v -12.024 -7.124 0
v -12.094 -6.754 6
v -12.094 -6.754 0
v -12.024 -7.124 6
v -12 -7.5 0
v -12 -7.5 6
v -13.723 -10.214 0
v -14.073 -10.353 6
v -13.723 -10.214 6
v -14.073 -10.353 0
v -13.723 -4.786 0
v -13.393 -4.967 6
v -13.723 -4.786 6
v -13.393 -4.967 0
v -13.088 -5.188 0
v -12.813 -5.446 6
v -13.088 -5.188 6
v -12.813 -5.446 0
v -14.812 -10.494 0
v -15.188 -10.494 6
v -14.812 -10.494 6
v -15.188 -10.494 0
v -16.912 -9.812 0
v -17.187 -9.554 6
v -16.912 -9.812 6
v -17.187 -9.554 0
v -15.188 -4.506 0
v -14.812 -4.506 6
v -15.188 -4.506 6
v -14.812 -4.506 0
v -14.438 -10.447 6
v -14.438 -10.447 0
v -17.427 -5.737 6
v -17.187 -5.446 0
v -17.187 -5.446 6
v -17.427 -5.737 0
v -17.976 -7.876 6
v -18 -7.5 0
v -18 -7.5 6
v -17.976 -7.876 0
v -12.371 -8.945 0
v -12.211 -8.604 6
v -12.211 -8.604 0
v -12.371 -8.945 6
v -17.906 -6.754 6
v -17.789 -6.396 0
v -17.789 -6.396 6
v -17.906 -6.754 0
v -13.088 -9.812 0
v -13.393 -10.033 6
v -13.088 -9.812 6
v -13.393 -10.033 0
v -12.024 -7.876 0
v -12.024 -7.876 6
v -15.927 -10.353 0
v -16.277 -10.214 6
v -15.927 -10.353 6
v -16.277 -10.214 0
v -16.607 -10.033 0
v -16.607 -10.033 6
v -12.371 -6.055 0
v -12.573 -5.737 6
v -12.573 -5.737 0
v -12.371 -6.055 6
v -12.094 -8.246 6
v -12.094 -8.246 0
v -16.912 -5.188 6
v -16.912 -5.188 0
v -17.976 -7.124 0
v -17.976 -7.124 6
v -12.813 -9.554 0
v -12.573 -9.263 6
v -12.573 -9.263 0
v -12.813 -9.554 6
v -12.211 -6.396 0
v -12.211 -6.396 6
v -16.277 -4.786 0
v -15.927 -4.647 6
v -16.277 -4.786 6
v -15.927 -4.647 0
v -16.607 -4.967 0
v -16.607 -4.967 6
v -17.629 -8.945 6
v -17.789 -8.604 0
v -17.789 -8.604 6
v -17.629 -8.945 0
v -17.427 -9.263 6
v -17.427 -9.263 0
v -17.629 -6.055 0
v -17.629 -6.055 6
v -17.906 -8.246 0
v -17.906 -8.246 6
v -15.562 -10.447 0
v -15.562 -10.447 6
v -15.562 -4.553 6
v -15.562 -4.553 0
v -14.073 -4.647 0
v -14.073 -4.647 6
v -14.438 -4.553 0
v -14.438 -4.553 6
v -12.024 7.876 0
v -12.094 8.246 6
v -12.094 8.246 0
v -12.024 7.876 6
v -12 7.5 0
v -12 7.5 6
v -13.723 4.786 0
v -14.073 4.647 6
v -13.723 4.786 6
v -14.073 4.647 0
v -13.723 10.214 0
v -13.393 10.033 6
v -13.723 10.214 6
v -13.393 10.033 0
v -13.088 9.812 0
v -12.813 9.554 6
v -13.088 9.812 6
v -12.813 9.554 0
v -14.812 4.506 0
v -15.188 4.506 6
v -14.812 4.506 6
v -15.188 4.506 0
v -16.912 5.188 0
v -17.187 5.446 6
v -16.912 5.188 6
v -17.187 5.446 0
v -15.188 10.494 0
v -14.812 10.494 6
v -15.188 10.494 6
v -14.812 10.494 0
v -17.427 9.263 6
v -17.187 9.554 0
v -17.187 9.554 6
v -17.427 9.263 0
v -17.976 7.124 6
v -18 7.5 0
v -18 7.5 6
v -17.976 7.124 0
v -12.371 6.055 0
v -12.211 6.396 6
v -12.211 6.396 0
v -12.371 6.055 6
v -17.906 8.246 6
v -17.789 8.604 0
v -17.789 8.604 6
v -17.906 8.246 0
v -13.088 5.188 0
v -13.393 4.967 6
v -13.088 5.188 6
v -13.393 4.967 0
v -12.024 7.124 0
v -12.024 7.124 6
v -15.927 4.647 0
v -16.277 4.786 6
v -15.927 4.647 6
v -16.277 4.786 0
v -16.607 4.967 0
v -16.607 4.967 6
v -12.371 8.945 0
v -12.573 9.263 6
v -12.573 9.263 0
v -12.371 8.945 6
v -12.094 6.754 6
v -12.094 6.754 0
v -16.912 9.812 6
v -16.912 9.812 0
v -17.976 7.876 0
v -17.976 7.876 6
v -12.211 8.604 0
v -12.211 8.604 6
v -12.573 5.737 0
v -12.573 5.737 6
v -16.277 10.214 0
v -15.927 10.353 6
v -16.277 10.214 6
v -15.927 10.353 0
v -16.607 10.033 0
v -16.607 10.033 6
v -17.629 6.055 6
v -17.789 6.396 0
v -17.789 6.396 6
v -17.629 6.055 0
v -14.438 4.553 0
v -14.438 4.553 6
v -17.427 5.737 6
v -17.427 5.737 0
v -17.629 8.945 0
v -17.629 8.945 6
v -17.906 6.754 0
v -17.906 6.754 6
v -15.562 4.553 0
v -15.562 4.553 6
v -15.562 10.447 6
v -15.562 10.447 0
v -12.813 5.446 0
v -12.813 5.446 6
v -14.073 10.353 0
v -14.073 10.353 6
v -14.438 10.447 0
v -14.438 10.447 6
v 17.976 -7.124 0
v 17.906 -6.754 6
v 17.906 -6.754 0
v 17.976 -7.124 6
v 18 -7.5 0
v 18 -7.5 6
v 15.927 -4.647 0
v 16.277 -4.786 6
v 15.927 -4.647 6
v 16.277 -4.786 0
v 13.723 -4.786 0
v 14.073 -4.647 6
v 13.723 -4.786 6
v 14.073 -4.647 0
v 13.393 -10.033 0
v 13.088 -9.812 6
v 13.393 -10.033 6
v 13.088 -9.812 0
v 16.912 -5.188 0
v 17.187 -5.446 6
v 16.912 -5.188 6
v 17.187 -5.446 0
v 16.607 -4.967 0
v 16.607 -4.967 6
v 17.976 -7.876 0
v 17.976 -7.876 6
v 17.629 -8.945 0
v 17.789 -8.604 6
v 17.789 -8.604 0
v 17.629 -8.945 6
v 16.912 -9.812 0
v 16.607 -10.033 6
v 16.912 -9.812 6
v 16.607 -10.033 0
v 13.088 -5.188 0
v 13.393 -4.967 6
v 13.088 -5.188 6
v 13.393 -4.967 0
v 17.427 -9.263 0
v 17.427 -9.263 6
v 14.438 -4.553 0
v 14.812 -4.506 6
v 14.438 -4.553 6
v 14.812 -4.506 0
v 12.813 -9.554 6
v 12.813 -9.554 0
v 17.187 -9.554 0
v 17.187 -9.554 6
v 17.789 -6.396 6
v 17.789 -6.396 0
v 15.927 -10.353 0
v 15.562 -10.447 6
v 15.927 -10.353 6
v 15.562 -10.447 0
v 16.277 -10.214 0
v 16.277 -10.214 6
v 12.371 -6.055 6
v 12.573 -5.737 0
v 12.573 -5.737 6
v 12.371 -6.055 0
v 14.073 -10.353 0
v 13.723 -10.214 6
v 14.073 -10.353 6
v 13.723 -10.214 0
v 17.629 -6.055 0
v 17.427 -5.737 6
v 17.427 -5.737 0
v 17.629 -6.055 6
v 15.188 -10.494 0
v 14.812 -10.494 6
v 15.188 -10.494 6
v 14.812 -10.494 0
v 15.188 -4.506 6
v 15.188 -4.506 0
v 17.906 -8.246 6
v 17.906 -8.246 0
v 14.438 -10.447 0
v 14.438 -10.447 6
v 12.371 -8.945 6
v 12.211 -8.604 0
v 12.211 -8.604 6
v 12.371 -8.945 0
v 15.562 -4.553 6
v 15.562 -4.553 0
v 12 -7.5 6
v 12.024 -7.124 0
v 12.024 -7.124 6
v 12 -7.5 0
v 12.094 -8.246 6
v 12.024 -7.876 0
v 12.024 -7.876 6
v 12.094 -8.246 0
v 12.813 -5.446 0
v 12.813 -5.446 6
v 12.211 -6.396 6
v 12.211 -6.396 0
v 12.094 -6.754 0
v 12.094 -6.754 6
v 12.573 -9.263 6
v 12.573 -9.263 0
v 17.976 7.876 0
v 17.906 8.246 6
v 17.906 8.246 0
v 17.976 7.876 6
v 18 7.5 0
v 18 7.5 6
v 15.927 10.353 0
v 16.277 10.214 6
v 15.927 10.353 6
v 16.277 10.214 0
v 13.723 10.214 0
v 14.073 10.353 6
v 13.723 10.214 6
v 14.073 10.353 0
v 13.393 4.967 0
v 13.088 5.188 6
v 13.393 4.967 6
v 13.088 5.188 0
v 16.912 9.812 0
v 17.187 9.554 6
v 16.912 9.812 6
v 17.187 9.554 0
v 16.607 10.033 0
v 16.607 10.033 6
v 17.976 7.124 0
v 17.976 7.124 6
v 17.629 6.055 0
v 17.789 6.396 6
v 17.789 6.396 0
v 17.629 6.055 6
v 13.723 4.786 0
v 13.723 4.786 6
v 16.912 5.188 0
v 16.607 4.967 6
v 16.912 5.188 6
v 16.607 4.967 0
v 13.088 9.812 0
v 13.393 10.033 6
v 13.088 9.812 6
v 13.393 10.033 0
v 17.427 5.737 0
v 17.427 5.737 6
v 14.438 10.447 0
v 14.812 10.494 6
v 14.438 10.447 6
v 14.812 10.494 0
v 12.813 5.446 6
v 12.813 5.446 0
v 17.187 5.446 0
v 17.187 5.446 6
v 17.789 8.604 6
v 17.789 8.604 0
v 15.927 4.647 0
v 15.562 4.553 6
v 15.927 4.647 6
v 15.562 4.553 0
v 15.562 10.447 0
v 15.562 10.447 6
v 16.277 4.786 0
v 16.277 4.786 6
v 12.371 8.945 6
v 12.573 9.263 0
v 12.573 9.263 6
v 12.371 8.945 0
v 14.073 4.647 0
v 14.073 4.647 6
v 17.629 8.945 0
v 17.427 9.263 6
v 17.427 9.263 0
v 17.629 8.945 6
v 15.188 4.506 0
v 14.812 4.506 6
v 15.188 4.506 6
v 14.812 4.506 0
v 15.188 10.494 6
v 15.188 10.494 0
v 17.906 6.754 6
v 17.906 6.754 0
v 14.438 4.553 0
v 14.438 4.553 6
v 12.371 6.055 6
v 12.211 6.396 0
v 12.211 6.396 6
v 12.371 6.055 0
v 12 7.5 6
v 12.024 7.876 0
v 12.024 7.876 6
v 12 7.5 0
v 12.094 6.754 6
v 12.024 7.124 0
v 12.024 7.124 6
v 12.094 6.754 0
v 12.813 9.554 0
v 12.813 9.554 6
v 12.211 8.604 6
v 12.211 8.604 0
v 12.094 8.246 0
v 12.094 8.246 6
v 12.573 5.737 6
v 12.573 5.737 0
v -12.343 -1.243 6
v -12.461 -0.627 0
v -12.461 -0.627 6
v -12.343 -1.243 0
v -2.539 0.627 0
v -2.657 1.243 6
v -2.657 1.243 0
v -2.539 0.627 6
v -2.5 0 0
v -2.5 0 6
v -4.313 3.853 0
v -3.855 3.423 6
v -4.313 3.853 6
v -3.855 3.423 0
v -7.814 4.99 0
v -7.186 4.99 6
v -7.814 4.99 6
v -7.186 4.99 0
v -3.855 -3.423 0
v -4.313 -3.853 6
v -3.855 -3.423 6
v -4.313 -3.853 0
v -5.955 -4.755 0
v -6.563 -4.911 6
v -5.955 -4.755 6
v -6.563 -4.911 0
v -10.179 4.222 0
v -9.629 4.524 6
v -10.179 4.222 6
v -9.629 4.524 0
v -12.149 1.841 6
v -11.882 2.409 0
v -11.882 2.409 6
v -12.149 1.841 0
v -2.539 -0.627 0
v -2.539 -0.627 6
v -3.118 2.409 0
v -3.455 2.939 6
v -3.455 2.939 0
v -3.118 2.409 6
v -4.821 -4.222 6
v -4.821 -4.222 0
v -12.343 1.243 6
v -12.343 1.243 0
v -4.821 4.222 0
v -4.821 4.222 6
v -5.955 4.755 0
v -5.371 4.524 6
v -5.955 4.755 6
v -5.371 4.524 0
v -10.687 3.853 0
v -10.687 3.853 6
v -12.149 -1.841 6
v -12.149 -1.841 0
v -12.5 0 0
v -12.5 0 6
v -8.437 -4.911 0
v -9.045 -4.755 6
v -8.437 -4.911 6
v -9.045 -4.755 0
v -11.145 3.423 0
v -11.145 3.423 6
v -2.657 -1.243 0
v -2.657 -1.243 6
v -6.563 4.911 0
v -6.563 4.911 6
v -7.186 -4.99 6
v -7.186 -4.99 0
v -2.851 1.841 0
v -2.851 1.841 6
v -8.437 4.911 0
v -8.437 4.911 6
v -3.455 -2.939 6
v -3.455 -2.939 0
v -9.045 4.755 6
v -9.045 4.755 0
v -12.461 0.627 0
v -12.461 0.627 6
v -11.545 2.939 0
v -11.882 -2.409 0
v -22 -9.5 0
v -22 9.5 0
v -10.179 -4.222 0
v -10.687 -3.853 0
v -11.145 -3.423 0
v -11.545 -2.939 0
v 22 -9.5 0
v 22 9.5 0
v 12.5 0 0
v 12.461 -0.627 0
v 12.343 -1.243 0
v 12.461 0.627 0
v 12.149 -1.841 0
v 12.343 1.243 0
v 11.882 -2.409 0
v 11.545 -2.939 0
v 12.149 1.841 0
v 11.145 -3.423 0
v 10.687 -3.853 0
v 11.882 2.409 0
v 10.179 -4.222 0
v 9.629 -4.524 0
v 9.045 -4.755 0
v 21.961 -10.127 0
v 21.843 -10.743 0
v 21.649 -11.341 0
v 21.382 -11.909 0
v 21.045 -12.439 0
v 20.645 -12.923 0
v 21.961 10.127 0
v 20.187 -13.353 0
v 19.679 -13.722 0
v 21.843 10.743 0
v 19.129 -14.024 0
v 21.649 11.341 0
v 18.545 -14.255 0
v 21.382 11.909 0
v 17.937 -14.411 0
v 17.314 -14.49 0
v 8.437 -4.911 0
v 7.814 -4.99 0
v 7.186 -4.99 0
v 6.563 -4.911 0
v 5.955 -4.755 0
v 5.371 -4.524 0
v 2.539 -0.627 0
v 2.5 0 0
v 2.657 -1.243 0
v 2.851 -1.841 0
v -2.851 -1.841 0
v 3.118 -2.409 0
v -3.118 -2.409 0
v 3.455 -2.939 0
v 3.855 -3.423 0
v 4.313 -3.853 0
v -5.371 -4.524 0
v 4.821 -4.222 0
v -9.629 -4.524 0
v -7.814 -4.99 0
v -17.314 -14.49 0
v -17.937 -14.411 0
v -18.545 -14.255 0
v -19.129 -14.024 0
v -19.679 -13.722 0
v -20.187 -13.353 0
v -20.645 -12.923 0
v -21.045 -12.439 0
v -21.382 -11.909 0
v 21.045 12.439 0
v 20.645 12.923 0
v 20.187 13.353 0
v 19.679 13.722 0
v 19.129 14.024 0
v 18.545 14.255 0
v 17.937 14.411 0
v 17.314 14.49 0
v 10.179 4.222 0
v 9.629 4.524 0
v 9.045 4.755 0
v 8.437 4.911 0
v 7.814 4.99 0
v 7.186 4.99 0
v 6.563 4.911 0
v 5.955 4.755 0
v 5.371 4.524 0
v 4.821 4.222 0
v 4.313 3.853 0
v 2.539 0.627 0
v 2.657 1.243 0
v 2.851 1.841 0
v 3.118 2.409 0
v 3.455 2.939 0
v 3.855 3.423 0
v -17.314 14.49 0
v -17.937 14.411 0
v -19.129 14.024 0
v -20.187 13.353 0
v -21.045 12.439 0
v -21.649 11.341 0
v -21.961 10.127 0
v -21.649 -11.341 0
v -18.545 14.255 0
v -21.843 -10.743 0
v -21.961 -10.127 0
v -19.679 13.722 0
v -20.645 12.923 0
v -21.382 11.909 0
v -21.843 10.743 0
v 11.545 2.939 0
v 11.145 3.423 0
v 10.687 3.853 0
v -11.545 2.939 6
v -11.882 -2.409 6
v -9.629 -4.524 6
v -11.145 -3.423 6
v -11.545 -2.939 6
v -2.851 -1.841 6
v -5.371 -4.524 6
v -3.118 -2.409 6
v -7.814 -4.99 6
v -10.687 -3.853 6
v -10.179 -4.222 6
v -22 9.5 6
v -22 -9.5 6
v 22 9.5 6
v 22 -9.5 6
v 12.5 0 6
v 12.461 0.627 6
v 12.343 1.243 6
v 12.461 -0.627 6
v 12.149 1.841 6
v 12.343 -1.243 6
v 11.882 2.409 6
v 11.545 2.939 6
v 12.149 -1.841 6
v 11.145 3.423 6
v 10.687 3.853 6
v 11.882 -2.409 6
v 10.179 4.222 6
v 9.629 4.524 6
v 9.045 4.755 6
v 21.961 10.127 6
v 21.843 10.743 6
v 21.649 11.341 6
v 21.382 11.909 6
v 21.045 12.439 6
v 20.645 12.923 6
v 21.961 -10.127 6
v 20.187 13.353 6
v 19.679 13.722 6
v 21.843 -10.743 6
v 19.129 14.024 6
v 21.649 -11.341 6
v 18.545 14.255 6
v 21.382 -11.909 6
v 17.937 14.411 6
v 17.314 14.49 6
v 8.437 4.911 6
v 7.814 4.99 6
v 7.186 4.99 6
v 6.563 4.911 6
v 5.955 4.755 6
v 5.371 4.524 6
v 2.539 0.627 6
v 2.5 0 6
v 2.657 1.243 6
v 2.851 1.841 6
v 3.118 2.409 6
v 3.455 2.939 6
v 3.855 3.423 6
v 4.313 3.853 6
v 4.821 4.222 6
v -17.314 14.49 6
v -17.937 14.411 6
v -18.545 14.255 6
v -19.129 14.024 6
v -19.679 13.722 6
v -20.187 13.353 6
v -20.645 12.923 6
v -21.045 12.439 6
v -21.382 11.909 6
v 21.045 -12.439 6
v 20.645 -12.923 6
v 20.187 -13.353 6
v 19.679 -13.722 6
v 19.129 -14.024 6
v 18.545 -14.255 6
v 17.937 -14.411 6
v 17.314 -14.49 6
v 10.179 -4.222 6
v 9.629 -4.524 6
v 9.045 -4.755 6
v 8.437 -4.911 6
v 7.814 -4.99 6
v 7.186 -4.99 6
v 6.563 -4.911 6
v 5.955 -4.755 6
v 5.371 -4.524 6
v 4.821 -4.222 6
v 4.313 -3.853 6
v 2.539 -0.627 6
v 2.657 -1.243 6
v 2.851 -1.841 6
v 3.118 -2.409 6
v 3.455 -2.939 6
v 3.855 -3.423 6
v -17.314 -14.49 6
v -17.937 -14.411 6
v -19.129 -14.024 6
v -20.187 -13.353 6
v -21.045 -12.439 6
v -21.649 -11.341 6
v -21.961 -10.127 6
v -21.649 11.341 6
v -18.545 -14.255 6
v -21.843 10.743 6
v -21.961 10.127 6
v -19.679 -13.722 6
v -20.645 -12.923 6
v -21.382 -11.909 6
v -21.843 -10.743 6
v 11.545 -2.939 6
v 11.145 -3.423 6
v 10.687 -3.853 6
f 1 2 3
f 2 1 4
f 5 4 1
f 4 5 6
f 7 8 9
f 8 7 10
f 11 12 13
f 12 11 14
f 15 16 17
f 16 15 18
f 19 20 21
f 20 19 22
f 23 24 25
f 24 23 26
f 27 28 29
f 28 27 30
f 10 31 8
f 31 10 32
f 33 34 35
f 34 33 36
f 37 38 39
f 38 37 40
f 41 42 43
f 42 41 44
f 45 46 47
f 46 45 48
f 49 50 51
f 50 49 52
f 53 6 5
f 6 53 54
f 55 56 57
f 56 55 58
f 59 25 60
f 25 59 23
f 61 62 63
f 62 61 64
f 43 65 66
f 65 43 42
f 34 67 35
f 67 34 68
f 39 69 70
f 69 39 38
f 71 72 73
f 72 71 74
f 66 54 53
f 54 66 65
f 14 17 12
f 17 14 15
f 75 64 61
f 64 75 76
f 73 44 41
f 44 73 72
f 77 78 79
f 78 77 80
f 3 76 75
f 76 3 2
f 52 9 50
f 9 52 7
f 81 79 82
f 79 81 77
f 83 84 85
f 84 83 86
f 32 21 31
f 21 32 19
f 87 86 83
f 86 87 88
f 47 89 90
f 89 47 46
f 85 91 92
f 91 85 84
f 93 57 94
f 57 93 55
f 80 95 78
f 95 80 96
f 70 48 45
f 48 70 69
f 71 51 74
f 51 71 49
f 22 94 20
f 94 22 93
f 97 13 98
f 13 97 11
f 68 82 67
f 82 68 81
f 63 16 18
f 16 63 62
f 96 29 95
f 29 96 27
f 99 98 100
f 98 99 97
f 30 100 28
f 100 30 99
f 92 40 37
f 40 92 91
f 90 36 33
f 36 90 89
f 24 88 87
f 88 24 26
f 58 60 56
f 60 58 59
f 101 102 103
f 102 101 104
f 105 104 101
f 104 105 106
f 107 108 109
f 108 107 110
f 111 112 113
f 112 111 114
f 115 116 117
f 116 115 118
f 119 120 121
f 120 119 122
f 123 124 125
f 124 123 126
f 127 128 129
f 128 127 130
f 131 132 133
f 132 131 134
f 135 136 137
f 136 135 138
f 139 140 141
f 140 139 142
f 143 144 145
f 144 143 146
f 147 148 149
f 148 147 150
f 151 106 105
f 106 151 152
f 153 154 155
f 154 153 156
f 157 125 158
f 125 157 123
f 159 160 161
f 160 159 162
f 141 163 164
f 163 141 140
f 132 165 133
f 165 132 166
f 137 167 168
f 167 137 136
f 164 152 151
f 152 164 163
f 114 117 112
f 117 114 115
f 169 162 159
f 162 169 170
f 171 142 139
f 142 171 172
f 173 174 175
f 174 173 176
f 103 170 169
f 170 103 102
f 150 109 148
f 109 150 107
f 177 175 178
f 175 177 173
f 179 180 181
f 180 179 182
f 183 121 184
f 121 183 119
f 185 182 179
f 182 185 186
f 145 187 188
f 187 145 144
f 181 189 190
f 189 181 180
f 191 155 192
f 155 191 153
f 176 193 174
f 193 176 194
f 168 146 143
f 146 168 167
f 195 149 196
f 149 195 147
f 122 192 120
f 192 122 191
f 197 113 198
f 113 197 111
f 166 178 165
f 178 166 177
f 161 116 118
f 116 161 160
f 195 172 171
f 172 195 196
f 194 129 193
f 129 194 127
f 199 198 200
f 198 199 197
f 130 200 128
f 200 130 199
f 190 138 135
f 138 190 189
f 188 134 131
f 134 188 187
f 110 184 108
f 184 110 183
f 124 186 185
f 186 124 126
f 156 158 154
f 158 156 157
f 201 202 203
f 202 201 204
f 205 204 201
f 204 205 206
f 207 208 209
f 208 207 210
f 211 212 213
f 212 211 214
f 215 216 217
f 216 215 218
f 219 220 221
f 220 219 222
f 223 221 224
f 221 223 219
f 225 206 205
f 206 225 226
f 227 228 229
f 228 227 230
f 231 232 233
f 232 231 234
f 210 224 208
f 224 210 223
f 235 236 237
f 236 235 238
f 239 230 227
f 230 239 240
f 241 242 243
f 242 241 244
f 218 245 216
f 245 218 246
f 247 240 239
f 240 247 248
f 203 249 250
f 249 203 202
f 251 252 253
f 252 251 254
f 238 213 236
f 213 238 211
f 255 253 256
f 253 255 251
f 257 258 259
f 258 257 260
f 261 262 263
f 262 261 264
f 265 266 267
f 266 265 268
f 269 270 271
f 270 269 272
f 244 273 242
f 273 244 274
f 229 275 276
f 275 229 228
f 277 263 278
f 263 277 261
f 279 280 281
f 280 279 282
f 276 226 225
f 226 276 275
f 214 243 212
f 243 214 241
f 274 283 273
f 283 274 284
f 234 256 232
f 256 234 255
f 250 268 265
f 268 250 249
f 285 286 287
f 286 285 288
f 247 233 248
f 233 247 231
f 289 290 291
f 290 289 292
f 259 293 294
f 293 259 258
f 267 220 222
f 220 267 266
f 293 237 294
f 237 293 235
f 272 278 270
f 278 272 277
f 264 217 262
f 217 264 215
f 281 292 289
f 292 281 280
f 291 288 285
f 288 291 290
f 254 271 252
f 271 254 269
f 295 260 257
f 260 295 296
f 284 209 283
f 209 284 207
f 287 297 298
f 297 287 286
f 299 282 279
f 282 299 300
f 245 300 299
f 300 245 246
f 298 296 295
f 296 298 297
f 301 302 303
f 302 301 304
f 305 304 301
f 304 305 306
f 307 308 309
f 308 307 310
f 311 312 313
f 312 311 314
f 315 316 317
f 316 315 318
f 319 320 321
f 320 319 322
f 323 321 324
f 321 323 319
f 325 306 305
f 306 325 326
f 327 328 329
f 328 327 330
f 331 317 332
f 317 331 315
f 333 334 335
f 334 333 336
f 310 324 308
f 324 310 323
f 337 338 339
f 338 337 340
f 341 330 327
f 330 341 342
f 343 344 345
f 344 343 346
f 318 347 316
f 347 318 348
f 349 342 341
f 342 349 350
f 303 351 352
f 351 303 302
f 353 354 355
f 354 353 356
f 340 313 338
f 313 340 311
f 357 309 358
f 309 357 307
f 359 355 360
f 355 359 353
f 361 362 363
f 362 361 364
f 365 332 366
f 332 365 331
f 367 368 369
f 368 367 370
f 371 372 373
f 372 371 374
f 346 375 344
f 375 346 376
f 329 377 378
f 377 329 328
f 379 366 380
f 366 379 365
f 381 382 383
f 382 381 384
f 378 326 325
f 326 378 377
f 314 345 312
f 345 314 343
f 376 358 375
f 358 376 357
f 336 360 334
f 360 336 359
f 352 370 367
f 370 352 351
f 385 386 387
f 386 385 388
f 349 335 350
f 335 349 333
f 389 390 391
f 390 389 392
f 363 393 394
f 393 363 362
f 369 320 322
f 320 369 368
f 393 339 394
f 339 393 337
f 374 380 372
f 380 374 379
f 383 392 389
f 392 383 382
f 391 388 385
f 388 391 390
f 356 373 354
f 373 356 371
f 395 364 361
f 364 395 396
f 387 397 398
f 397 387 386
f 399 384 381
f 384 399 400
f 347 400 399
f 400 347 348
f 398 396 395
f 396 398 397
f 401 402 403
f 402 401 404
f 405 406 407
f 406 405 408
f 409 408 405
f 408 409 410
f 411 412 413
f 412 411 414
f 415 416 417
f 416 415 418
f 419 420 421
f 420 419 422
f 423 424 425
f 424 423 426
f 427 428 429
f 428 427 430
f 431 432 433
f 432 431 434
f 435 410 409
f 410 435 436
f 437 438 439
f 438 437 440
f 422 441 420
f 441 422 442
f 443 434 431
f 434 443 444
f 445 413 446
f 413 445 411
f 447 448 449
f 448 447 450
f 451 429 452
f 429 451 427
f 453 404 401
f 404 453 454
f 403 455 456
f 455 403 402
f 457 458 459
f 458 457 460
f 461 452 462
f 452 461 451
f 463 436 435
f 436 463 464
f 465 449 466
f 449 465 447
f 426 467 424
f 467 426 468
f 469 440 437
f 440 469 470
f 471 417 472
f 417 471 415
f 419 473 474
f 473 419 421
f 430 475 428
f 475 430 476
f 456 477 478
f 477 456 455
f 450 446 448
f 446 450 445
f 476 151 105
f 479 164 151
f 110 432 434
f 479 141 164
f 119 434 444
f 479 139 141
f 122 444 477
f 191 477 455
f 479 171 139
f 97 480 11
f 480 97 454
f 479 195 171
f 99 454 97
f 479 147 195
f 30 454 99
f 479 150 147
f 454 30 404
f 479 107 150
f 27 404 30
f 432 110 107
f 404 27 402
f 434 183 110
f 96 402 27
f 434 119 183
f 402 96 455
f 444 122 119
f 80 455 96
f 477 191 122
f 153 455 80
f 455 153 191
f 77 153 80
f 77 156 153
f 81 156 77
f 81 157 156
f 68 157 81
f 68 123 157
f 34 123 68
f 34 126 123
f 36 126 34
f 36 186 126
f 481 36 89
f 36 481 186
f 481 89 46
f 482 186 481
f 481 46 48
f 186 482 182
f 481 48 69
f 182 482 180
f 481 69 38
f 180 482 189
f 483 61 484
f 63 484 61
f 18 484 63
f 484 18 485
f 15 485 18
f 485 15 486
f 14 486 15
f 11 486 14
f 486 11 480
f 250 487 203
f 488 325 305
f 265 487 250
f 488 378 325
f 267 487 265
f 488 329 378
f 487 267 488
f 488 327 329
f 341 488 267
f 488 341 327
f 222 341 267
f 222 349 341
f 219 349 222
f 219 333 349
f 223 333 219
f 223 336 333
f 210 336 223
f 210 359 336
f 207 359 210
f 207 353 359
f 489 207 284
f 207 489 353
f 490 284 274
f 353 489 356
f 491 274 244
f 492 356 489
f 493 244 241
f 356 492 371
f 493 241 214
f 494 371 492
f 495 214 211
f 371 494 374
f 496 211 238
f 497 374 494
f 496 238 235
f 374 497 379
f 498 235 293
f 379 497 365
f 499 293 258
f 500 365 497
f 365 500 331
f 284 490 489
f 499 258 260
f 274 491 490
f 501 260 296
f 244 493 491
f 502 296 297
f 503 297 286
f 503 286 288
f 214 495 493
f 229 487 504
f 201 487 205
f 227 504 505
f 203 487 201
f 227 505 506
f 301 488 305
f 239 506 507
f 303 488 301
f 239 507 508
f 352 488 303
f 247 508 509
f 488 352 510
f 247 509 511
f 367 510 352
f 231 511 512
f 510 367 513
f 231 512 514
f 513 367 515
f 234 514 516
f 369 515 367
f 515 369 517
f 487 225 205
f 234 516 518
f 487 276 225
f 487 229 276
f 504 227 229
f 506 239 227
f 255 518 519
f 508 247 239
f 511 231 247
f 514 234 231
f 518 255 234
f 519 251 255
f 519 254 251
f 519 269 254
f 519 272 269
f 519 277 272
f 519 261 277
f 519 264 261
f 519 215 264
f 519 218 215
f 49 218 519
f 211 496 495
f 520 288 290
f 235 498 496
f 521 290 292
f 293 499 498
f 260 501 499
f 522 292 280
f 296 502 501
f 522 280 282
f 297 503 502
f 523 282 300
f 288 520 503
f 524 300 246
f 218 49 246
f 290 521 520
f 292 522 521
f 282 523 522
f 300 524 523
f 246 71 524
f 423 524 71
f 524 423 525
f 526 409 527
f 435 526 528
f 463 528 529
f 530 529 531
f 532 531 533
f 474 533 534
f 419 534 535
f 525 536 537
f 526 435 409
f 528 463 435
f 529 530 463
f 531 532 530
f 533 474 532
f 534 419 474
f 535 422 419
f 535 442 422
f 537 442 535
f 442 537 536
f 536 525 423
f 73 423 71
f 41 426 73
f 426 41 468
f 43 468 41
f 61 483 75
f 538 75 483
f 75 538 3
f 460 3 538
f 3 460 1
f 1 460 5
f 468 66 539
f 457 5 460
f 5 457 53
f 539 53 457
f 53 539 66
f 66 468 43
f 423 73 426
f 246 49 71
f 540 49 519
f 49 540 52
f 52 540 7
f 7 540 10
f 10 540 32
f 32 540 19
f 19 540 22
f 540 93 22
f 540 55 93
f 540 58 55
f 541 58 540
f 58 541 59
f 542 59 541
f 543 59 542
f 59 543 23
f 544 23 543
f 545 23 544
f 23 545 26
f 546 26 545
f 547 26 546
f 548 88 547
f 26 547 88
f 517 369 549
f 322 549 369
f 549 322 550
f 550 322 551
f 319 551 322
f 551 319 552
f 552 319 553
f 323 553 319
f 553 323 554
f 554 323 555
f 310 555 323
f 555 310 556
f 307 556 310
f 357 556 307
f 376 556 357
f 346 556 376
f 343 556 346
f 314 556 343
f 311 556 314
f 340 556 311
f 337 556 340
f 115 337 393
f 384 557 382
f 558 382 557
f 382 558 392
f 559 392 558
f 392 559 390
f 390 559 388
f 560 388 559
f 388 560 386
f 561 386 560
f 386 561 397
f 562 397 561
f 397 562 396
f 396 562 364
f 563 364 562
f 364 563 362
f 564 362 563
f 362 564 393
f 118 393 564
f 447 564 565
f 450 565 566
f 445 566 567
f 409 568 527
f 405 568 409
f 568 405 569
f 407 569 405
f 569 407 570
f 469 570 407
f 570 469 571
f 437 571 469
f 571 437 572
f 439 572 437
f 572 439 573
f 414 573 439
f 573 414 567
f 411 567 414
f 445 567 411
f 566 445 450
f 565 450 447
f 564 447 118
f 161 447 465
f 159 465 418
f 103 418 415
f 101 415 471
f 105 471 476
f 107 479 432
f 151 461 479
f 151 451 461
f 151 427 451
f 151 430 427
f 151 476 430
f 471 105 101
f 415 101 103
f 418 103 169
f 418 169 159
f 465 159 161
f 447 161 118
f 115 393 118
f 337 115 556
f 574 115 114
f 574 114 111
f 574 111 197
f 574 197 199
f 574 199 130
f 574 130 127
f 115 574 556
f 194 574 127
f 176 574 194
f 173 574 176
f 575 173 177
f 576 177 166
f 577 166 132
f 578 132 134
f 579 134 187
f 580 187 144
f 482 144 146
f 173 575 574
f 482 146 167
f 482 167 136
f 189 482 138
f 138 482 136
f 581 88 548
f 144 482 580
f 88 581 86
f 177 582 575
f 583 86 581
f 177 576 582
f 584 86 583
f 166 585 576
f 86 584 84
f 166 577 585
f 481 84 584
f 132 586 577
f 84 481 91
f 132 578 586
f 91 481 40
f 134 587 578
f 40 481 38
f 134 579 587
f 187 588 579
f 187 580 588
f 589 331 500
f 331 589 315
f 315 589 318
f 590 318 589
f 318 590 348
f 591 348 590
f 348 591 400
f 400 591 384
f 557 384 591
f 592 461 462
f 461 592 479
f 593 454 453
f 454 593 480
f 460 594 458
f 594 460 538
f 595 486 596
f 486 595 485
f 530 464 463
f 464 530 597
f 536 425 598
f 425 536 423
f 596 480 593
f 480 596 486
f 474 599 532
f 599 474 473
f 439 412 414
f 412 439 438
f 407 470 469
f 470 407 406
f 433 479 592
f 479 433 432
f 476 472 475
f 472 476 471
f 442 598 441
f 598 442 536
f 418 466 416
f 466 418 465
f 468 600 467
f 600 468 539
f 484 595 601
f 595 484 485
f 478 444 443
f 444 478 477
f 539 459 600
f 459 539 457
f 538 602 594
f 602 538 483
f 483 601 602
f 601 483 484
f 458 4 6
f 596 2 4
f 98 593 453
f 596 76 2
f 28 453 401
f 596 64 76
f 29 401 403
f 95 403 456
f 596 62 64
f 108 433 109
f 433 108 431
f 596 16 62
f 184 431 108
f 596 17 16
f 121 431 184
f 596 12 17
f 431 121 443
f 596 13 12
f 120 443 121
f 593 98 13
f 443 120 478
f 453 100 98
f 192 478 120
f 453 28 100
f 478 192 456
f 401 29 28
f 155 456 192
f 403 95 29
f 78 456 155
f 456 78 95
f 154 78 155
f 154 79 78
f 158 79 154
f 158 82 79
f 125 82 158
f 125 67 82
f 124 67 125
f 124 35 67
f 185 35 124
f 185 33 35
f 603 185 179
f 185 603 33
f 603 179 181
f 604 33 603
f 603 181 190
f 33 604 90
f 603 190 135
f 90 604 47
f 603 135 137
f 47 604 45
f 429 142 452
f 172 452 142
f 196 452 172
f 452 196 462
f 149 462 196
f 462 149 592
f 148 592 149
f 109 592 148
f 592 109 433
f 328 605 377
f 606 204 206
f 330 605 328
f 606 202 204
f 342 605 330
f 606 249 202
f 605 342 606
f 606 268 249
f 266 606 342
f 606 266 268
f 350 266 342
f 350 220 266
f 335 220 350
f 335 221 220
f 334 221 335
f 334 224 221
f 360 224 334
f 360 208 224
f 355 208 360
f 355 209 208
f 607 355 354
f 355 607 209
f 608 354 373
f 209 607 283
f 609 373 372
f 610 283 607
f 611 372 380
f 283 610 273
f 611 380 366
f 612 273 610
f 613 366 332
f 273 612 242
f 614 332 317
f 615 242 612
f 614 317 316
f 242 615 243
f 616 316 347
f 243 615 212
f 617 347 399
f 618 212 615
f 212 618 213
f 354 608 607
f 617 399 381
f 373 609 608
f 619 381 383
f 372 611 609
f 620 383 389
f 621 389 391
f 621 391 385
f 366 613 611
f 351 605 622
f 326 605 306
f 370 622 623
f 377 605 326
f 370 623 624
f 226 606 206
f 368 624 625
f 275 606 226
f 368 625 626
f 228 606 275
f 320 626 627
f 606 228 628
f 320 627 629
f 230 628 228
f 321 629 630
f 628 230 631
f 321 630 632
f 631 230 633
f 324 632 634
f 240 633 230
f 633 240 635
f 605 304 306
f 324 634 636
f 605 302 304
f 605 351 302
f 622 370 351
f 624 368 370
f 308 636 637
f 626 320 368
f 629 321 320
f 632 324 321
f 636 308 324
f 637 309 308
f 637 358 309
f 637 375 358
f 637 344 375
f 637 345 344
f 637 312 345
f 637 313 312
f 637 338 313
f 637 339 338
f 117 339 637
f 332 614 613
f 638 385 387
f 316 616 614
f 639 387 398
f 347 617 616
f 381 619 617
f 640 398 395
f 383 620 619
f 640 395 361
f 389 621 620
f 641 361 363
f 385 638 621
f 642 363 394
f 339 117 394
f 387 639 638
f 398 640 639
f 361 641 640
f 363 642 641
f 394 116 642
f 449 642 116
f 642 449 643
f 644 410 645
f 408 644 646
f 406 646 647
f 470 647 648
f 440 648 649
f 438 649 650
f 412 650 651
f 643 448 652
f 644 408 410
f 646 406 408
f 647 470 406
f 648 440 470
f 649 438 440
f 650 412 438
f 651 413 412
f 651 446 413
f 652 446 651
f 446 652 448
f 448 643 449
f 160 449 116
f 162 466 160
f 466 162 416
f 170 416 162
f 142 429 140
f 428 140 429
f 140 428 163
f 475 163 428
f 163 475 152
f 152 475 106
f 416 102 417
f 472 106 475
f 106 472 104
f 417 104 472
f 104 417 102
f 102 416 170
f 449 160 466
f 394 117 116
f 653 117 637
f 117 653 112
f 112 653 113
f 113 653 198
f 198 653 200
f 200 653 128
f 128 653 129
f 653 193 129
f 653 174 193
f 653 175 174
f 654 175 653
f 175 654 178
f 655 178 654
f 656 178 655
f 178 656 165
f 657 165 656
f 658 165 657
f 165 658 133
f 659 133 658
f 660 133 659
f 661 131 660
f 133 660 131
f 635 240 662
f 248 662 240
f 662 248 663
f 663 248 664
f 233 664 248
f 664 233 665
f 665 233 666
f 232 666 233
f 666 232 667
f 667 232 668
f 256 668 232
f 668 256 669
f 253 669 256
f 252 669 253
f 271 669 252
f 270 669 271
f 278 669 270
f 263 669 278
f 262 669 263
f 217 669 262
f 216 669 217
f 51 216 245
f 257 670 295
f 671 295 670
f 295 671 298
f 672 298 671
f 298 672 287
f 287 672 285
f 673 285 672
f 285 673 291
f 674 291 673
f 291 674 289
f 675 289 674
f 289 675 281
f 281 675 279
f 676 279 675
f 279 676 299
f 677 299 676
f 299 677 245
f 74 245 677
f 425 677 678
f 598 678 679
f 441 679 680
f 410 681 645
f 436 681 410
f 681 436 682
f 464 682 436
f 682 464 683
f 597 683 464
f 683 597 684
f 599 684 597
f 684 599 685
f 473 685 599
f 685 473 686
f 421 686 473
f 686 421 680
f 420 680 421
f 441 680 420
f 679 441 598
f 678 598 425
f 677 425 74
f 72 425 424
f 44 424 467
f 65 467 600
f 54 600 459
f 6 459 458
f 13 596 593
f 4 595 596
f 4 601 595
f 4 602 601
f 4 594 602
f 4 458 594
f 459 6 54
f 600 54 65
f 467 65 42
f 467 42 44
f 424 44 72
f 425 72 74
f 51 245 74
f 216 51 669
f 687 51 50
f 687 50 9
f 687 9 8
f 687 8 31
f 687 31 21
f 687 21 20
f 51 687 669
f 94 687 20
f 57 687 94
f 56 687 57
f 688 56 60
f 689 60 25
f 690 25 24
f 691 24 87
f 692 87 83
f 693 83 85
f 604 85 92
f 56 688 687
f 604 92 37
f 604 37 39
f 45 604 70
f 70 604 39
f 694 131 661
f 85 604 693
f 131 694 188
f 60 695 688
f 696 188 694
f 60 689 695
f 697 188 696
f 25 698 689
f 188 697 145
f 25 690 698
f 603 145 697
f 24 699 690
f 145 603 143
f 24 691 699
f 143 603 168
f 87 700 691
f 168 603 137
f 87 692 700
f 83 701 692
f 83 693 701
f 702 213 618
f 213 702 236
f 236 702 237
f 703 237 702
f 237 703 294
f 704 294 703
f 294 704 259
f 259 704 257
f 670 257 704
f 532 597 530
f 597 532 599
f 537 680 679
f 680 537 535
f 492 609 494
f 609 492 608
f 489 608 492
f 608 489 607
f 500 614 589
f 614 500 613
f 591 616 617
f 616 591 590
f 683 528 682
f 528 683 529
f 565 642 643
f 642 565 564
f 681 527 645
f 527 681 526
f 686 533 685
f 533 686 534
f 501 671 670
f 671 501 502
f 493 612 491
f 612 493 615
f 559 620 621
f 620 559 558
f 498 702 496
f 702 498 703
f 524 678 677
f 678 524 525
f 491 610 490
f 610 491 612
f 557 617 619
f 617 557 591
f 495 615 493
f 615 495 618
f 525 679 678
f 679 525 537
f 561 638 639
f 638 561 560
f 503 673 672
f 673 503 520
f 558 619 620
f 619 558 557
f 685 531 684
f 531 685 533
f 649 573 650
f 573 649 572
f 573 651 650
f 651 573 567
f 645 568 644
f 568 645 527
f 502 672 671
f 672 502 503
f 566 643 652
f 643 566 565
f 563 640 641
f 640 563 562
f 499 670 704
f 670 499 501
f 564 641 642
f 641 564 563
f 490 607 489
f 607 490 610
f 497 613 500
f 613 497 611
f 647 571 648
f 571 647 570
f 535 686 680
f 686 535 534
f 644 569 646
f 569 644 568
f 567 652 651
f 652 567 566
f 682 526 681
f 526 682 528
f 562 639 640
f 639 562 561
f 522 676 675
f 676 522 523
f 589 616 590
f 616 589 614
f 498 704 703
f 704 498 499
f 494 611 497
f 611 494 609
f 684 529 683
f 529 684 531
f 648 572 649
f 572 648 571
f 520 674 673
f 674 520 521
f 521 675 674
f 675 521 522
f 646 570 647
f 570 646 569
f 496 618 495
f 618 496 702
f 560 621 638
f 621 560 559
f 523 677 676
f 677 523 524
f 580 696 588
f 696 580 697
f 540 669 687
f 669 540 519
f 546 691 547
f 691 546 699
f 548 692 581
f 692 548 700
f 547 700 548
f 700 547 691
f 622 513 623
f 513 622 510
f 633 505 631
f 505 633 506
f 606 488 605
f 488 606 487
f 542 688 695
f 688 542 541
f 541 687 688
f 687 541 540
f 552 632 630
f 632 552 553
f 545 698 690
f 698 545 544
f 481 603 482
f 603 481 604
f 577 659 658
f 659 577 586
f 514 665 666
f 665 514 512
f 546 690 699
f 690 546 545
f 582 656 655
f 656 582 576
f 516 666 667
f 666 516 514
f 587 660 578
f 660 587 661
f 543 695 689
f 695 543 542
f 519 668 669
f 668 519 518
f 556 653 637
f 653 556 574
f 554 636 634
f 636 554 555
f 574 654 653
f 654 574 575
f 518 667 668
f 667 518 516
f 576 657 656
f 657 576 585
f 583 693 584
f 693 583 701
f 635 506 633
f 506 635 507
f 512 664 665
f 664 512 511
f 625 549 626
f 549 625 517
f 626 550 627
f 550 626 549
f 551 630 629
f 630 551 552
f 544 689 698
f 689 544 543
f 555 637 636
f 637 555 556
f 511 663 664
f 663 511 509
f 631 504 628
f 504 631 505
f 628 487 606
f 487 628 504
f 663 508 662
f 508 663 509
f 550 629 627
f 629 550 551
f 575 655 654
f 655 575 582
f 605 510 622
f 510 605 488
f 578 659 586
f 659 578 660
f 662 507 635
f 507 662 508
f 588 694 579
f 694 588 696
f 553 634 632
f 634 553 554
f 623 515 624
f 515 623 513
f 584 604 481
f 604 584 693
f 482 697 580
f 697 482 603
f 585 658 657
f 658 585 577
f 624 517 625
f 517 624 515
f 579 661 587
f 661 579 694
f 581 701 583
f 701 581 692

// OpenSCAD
$fn = 50;


difference() {
	union() {
		hull() {
			translate(v = [-17.0000000000, 9.5000000000, 0]) {
				cylinder(h = 6, r = 5);
			}
			translate(v = [17.0000000000, 9.5000000000, 0]) {
				cylinder(h = 6, r = 5);
			}
			translate(v = [-17.0000000000, -9.5000000000, 0]) {
				cylinder(h = 6, r = 5);
			}
			translate(v = [17.0000000000, -9.5000000000, 0]) {
				cylinder(h = 6, r = 5);
			}
		}
	}
	union() {
		#translate(v = [-15.0000000000, -7.5000000000, -100.0000000000]) {
			cylinder(h = 200, r = 3.0000000000);
		}
		#translate(v = [-15.0000000000, 7.5000000000, -100.0000000000]) {
			cylinder(h = 200, r = 3.0000000000);
		}
		#translate(v = [15.0000000000, -7.5000000000, -100.0000000000]) {
			cylinder(h = 200, r = 3.0000000000);
		}
		#translate(v = [15.0000000000, 7.5000000000, -100.0000000000]) {
			cylinder(h = 200, r = 3.0000000000);
		}
		#translate(v = [-7.5000000000, 0, 0]) {
			cylinder(h = 6, r = 5.0000000000);
		}
		#translate(v = [7.5000000000, 0, 0]) {
			cylinder(h = 6, r = 5.0000000000);
		}
	}
}
